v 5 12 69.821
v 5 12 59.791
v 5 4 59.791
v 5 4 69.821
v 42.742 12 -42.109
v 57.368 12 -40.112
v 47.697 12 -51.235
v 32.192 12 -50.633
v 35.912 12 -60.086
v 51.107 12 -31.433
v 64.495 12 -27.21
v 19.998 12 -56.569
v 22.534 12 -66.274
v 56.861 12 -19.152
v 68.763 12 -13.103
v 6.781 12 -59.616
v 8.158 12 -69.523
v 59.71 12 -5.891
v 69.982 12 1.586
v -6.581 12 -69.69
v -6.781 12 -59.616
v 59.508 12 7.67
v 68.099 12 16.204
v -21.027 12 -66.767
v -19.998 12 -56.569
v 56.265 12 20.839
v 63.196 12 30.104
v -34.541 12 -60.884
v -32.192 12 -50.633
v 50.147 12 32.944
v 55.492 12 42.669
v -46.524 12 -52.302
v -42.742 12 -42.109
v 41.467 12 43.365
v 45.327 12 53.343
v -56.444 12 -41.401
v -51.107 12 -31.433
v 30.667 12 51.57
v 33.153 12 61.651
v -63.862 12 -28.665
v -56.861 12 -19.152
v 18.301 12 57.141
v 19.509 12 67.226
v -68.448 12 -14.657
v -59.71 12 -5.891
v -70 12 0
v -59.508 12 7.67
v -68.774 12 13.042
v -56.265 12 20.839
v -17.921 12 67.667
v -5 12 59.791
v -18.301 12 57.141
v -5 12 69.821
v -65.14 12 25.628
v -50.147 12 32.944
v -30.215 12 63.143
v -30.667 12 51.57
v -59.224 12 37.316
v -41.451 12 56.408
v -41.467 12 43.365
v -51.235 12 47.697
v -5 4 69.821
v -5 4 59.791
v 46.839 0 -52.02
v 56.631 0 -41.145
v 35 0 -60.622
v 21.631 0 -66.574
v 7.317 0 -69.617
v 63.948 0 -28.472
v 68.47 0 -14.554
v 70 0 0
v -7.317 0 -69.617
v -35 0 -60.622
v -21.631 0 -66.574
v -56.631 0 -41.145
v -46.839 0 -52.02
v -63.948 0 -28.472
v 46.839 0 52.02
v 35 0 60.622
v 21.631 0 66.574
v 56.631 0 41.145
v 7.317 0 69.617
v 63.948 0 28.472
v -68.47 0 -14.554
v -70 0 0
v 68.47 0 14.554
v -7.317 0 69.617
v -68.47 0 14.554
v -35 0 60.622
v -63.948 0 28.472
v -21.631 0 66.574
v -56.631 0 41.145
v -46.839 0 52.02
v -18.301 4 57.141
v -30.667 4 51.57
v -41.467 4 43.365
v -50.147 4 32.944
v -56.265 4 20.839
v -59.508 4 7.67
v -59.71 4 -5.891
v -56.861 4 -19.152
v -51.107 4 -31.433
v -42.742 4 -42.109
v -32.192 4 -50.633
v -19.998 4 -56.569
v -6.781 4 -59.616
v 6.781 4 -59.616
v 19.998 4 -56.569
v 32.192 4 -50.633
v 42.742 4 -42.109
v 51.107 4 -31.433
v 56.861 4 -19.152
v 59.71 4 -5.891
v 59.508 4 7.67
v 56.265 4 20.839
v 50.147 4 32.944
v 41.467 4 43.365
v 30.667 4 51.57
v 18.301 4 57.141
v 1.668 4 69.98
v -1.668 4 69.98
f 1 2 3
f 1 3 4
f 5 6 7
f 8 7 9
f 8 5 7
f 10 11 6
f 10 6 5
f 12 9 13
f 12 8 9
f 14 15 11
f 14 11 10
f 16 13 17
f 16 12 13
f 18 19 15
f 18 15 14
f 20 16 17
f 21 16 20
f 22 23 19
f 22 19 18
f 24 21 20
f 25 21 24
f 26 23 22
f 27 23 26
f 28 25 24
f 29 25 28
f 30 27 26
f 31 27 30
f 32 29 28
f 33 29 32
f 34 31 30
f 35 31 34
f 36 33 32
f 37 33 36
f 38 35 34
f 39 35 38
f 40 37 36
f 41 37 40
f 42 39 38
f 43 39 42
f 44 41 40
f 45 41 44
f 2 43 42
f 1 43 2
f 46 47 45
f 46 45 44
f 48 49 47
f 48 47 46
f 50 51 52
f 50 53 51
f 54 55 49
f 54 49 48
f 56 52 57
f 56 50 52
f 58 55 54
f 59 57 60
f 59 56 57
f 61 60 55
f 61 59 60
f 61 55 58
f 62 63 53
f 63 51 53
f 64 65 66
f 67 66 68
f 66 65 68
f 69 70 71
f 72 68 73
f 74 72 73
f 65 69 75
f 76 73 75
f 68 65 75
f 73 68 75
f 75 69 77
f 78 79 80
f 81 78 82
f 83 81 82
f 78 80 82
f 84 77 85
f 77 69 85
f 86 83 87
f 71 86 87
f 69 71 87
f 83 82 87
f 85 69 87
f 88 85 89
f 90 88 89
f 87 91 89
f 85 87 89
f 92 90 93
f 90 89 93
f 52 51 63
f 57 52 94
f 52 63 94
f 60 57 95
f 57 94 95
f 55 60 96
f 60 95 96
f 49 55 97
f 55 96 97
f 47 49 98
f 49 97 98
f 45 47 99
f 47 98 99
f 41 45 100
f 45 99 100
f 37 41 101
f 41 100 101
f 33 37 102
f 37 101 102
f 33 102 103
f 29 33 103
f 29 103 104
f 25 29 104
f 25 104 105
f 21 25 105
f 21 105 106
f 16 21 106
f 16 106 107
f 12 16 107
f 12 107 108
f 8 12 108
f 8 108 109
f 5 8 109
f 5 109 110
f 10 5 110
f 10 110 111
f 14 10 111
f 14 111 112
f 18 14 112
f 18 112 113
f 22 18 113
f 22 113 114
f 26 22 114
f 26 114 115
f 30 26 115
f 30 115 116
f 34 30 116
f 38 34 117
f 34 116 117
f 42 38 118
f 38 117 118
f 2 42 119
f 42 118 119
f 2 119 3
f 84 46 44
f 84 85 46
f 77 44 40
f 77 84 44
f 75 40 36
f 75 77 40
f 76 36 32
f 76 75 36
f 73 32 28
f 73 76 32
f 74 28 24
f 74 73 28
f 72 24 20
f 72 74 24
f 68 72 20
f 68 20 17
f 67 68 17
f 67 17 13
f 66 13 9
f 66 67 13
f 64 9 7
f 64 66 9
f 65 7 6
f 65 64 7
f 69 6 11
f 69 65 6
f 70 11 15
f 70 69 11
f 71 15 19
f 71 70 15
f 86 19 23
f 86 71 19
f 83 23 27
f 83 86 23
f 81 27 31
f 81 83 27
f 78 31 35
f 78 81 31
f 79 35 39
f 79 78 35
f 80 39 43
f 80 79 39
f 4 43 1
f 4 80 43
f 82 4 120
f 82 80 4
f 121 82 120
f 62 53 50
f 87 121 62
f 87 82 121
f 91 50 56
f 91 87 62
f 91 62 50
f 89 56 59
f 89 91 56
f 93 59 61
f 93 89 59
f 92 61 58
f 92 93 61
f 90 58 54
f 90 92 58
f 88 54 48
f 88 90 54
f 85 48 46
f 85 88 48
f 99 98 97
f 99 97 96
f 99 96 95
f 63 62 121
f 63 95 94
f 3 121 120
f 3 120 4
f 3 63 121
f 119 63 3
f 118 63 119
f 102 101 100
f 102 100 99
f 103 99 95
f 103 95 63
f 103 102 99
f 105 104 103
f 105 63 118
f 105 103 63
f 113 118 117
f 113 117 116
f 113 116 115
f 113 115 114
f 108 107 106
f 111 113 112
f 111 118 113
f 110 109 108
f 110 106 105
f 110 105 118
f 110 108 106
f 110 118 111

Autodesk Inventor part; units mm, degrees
ref_plane "YZ Plane" through (0, 0, 0) normal (1, 0, 0) x (0, 1, 0)
ref_plane "XZ Plane" through (0, 0, 0) normal (0, 1, 0) x (-1, 0, 0)
ref_plane "XY Plane" through (0, 0, 0) normal (0, 0, 1) x (1, 0, 0)
sketch "스케치1" plane through (0, 0, 0) normal (0, 1, 0) x (-1, 0, 0)
  circle A0 centre (0, 0) radius 70
  circle A1 centre (0, 0) radius 60
  line L0 (-59.7913, -5) -> (-69.8212, -5)
  line L1 (-59.7913, 5) -> (-69.8212, 5)
  dimension "d0" = 140
  dimension "d1" = 120
  dimension "d7" = 5
extrude "돌출1" add sketch "스케치1" along normal blind 12 contours A0 L0 A1 L1 | L1 A1 L0 A0
extrude "돌출2" add sketch "스케치1" along normal blind 4 contours A1
sketch "스케치2" plane through (0, 12, 0) normal (0, 1, 0) x (1, 0, 0)
  line L0 (5, -59.7913) -> (5, -69.8212)
  line L1 (-5, -59.7913) -> (-5, -69.8212)
  circle A0 centre (0, 0) radius 60 projected
  circle A1 centre (0, 0) radius 70 projected
  dimension "d8" = 10
  dimension "d9" = 5
extrude "돌출3" cut sketch "스케치2" against normal blind 8 contours L0 A1 L1 A0 picked at (3.8895, -63.1964)
properties part number "gps_case"
